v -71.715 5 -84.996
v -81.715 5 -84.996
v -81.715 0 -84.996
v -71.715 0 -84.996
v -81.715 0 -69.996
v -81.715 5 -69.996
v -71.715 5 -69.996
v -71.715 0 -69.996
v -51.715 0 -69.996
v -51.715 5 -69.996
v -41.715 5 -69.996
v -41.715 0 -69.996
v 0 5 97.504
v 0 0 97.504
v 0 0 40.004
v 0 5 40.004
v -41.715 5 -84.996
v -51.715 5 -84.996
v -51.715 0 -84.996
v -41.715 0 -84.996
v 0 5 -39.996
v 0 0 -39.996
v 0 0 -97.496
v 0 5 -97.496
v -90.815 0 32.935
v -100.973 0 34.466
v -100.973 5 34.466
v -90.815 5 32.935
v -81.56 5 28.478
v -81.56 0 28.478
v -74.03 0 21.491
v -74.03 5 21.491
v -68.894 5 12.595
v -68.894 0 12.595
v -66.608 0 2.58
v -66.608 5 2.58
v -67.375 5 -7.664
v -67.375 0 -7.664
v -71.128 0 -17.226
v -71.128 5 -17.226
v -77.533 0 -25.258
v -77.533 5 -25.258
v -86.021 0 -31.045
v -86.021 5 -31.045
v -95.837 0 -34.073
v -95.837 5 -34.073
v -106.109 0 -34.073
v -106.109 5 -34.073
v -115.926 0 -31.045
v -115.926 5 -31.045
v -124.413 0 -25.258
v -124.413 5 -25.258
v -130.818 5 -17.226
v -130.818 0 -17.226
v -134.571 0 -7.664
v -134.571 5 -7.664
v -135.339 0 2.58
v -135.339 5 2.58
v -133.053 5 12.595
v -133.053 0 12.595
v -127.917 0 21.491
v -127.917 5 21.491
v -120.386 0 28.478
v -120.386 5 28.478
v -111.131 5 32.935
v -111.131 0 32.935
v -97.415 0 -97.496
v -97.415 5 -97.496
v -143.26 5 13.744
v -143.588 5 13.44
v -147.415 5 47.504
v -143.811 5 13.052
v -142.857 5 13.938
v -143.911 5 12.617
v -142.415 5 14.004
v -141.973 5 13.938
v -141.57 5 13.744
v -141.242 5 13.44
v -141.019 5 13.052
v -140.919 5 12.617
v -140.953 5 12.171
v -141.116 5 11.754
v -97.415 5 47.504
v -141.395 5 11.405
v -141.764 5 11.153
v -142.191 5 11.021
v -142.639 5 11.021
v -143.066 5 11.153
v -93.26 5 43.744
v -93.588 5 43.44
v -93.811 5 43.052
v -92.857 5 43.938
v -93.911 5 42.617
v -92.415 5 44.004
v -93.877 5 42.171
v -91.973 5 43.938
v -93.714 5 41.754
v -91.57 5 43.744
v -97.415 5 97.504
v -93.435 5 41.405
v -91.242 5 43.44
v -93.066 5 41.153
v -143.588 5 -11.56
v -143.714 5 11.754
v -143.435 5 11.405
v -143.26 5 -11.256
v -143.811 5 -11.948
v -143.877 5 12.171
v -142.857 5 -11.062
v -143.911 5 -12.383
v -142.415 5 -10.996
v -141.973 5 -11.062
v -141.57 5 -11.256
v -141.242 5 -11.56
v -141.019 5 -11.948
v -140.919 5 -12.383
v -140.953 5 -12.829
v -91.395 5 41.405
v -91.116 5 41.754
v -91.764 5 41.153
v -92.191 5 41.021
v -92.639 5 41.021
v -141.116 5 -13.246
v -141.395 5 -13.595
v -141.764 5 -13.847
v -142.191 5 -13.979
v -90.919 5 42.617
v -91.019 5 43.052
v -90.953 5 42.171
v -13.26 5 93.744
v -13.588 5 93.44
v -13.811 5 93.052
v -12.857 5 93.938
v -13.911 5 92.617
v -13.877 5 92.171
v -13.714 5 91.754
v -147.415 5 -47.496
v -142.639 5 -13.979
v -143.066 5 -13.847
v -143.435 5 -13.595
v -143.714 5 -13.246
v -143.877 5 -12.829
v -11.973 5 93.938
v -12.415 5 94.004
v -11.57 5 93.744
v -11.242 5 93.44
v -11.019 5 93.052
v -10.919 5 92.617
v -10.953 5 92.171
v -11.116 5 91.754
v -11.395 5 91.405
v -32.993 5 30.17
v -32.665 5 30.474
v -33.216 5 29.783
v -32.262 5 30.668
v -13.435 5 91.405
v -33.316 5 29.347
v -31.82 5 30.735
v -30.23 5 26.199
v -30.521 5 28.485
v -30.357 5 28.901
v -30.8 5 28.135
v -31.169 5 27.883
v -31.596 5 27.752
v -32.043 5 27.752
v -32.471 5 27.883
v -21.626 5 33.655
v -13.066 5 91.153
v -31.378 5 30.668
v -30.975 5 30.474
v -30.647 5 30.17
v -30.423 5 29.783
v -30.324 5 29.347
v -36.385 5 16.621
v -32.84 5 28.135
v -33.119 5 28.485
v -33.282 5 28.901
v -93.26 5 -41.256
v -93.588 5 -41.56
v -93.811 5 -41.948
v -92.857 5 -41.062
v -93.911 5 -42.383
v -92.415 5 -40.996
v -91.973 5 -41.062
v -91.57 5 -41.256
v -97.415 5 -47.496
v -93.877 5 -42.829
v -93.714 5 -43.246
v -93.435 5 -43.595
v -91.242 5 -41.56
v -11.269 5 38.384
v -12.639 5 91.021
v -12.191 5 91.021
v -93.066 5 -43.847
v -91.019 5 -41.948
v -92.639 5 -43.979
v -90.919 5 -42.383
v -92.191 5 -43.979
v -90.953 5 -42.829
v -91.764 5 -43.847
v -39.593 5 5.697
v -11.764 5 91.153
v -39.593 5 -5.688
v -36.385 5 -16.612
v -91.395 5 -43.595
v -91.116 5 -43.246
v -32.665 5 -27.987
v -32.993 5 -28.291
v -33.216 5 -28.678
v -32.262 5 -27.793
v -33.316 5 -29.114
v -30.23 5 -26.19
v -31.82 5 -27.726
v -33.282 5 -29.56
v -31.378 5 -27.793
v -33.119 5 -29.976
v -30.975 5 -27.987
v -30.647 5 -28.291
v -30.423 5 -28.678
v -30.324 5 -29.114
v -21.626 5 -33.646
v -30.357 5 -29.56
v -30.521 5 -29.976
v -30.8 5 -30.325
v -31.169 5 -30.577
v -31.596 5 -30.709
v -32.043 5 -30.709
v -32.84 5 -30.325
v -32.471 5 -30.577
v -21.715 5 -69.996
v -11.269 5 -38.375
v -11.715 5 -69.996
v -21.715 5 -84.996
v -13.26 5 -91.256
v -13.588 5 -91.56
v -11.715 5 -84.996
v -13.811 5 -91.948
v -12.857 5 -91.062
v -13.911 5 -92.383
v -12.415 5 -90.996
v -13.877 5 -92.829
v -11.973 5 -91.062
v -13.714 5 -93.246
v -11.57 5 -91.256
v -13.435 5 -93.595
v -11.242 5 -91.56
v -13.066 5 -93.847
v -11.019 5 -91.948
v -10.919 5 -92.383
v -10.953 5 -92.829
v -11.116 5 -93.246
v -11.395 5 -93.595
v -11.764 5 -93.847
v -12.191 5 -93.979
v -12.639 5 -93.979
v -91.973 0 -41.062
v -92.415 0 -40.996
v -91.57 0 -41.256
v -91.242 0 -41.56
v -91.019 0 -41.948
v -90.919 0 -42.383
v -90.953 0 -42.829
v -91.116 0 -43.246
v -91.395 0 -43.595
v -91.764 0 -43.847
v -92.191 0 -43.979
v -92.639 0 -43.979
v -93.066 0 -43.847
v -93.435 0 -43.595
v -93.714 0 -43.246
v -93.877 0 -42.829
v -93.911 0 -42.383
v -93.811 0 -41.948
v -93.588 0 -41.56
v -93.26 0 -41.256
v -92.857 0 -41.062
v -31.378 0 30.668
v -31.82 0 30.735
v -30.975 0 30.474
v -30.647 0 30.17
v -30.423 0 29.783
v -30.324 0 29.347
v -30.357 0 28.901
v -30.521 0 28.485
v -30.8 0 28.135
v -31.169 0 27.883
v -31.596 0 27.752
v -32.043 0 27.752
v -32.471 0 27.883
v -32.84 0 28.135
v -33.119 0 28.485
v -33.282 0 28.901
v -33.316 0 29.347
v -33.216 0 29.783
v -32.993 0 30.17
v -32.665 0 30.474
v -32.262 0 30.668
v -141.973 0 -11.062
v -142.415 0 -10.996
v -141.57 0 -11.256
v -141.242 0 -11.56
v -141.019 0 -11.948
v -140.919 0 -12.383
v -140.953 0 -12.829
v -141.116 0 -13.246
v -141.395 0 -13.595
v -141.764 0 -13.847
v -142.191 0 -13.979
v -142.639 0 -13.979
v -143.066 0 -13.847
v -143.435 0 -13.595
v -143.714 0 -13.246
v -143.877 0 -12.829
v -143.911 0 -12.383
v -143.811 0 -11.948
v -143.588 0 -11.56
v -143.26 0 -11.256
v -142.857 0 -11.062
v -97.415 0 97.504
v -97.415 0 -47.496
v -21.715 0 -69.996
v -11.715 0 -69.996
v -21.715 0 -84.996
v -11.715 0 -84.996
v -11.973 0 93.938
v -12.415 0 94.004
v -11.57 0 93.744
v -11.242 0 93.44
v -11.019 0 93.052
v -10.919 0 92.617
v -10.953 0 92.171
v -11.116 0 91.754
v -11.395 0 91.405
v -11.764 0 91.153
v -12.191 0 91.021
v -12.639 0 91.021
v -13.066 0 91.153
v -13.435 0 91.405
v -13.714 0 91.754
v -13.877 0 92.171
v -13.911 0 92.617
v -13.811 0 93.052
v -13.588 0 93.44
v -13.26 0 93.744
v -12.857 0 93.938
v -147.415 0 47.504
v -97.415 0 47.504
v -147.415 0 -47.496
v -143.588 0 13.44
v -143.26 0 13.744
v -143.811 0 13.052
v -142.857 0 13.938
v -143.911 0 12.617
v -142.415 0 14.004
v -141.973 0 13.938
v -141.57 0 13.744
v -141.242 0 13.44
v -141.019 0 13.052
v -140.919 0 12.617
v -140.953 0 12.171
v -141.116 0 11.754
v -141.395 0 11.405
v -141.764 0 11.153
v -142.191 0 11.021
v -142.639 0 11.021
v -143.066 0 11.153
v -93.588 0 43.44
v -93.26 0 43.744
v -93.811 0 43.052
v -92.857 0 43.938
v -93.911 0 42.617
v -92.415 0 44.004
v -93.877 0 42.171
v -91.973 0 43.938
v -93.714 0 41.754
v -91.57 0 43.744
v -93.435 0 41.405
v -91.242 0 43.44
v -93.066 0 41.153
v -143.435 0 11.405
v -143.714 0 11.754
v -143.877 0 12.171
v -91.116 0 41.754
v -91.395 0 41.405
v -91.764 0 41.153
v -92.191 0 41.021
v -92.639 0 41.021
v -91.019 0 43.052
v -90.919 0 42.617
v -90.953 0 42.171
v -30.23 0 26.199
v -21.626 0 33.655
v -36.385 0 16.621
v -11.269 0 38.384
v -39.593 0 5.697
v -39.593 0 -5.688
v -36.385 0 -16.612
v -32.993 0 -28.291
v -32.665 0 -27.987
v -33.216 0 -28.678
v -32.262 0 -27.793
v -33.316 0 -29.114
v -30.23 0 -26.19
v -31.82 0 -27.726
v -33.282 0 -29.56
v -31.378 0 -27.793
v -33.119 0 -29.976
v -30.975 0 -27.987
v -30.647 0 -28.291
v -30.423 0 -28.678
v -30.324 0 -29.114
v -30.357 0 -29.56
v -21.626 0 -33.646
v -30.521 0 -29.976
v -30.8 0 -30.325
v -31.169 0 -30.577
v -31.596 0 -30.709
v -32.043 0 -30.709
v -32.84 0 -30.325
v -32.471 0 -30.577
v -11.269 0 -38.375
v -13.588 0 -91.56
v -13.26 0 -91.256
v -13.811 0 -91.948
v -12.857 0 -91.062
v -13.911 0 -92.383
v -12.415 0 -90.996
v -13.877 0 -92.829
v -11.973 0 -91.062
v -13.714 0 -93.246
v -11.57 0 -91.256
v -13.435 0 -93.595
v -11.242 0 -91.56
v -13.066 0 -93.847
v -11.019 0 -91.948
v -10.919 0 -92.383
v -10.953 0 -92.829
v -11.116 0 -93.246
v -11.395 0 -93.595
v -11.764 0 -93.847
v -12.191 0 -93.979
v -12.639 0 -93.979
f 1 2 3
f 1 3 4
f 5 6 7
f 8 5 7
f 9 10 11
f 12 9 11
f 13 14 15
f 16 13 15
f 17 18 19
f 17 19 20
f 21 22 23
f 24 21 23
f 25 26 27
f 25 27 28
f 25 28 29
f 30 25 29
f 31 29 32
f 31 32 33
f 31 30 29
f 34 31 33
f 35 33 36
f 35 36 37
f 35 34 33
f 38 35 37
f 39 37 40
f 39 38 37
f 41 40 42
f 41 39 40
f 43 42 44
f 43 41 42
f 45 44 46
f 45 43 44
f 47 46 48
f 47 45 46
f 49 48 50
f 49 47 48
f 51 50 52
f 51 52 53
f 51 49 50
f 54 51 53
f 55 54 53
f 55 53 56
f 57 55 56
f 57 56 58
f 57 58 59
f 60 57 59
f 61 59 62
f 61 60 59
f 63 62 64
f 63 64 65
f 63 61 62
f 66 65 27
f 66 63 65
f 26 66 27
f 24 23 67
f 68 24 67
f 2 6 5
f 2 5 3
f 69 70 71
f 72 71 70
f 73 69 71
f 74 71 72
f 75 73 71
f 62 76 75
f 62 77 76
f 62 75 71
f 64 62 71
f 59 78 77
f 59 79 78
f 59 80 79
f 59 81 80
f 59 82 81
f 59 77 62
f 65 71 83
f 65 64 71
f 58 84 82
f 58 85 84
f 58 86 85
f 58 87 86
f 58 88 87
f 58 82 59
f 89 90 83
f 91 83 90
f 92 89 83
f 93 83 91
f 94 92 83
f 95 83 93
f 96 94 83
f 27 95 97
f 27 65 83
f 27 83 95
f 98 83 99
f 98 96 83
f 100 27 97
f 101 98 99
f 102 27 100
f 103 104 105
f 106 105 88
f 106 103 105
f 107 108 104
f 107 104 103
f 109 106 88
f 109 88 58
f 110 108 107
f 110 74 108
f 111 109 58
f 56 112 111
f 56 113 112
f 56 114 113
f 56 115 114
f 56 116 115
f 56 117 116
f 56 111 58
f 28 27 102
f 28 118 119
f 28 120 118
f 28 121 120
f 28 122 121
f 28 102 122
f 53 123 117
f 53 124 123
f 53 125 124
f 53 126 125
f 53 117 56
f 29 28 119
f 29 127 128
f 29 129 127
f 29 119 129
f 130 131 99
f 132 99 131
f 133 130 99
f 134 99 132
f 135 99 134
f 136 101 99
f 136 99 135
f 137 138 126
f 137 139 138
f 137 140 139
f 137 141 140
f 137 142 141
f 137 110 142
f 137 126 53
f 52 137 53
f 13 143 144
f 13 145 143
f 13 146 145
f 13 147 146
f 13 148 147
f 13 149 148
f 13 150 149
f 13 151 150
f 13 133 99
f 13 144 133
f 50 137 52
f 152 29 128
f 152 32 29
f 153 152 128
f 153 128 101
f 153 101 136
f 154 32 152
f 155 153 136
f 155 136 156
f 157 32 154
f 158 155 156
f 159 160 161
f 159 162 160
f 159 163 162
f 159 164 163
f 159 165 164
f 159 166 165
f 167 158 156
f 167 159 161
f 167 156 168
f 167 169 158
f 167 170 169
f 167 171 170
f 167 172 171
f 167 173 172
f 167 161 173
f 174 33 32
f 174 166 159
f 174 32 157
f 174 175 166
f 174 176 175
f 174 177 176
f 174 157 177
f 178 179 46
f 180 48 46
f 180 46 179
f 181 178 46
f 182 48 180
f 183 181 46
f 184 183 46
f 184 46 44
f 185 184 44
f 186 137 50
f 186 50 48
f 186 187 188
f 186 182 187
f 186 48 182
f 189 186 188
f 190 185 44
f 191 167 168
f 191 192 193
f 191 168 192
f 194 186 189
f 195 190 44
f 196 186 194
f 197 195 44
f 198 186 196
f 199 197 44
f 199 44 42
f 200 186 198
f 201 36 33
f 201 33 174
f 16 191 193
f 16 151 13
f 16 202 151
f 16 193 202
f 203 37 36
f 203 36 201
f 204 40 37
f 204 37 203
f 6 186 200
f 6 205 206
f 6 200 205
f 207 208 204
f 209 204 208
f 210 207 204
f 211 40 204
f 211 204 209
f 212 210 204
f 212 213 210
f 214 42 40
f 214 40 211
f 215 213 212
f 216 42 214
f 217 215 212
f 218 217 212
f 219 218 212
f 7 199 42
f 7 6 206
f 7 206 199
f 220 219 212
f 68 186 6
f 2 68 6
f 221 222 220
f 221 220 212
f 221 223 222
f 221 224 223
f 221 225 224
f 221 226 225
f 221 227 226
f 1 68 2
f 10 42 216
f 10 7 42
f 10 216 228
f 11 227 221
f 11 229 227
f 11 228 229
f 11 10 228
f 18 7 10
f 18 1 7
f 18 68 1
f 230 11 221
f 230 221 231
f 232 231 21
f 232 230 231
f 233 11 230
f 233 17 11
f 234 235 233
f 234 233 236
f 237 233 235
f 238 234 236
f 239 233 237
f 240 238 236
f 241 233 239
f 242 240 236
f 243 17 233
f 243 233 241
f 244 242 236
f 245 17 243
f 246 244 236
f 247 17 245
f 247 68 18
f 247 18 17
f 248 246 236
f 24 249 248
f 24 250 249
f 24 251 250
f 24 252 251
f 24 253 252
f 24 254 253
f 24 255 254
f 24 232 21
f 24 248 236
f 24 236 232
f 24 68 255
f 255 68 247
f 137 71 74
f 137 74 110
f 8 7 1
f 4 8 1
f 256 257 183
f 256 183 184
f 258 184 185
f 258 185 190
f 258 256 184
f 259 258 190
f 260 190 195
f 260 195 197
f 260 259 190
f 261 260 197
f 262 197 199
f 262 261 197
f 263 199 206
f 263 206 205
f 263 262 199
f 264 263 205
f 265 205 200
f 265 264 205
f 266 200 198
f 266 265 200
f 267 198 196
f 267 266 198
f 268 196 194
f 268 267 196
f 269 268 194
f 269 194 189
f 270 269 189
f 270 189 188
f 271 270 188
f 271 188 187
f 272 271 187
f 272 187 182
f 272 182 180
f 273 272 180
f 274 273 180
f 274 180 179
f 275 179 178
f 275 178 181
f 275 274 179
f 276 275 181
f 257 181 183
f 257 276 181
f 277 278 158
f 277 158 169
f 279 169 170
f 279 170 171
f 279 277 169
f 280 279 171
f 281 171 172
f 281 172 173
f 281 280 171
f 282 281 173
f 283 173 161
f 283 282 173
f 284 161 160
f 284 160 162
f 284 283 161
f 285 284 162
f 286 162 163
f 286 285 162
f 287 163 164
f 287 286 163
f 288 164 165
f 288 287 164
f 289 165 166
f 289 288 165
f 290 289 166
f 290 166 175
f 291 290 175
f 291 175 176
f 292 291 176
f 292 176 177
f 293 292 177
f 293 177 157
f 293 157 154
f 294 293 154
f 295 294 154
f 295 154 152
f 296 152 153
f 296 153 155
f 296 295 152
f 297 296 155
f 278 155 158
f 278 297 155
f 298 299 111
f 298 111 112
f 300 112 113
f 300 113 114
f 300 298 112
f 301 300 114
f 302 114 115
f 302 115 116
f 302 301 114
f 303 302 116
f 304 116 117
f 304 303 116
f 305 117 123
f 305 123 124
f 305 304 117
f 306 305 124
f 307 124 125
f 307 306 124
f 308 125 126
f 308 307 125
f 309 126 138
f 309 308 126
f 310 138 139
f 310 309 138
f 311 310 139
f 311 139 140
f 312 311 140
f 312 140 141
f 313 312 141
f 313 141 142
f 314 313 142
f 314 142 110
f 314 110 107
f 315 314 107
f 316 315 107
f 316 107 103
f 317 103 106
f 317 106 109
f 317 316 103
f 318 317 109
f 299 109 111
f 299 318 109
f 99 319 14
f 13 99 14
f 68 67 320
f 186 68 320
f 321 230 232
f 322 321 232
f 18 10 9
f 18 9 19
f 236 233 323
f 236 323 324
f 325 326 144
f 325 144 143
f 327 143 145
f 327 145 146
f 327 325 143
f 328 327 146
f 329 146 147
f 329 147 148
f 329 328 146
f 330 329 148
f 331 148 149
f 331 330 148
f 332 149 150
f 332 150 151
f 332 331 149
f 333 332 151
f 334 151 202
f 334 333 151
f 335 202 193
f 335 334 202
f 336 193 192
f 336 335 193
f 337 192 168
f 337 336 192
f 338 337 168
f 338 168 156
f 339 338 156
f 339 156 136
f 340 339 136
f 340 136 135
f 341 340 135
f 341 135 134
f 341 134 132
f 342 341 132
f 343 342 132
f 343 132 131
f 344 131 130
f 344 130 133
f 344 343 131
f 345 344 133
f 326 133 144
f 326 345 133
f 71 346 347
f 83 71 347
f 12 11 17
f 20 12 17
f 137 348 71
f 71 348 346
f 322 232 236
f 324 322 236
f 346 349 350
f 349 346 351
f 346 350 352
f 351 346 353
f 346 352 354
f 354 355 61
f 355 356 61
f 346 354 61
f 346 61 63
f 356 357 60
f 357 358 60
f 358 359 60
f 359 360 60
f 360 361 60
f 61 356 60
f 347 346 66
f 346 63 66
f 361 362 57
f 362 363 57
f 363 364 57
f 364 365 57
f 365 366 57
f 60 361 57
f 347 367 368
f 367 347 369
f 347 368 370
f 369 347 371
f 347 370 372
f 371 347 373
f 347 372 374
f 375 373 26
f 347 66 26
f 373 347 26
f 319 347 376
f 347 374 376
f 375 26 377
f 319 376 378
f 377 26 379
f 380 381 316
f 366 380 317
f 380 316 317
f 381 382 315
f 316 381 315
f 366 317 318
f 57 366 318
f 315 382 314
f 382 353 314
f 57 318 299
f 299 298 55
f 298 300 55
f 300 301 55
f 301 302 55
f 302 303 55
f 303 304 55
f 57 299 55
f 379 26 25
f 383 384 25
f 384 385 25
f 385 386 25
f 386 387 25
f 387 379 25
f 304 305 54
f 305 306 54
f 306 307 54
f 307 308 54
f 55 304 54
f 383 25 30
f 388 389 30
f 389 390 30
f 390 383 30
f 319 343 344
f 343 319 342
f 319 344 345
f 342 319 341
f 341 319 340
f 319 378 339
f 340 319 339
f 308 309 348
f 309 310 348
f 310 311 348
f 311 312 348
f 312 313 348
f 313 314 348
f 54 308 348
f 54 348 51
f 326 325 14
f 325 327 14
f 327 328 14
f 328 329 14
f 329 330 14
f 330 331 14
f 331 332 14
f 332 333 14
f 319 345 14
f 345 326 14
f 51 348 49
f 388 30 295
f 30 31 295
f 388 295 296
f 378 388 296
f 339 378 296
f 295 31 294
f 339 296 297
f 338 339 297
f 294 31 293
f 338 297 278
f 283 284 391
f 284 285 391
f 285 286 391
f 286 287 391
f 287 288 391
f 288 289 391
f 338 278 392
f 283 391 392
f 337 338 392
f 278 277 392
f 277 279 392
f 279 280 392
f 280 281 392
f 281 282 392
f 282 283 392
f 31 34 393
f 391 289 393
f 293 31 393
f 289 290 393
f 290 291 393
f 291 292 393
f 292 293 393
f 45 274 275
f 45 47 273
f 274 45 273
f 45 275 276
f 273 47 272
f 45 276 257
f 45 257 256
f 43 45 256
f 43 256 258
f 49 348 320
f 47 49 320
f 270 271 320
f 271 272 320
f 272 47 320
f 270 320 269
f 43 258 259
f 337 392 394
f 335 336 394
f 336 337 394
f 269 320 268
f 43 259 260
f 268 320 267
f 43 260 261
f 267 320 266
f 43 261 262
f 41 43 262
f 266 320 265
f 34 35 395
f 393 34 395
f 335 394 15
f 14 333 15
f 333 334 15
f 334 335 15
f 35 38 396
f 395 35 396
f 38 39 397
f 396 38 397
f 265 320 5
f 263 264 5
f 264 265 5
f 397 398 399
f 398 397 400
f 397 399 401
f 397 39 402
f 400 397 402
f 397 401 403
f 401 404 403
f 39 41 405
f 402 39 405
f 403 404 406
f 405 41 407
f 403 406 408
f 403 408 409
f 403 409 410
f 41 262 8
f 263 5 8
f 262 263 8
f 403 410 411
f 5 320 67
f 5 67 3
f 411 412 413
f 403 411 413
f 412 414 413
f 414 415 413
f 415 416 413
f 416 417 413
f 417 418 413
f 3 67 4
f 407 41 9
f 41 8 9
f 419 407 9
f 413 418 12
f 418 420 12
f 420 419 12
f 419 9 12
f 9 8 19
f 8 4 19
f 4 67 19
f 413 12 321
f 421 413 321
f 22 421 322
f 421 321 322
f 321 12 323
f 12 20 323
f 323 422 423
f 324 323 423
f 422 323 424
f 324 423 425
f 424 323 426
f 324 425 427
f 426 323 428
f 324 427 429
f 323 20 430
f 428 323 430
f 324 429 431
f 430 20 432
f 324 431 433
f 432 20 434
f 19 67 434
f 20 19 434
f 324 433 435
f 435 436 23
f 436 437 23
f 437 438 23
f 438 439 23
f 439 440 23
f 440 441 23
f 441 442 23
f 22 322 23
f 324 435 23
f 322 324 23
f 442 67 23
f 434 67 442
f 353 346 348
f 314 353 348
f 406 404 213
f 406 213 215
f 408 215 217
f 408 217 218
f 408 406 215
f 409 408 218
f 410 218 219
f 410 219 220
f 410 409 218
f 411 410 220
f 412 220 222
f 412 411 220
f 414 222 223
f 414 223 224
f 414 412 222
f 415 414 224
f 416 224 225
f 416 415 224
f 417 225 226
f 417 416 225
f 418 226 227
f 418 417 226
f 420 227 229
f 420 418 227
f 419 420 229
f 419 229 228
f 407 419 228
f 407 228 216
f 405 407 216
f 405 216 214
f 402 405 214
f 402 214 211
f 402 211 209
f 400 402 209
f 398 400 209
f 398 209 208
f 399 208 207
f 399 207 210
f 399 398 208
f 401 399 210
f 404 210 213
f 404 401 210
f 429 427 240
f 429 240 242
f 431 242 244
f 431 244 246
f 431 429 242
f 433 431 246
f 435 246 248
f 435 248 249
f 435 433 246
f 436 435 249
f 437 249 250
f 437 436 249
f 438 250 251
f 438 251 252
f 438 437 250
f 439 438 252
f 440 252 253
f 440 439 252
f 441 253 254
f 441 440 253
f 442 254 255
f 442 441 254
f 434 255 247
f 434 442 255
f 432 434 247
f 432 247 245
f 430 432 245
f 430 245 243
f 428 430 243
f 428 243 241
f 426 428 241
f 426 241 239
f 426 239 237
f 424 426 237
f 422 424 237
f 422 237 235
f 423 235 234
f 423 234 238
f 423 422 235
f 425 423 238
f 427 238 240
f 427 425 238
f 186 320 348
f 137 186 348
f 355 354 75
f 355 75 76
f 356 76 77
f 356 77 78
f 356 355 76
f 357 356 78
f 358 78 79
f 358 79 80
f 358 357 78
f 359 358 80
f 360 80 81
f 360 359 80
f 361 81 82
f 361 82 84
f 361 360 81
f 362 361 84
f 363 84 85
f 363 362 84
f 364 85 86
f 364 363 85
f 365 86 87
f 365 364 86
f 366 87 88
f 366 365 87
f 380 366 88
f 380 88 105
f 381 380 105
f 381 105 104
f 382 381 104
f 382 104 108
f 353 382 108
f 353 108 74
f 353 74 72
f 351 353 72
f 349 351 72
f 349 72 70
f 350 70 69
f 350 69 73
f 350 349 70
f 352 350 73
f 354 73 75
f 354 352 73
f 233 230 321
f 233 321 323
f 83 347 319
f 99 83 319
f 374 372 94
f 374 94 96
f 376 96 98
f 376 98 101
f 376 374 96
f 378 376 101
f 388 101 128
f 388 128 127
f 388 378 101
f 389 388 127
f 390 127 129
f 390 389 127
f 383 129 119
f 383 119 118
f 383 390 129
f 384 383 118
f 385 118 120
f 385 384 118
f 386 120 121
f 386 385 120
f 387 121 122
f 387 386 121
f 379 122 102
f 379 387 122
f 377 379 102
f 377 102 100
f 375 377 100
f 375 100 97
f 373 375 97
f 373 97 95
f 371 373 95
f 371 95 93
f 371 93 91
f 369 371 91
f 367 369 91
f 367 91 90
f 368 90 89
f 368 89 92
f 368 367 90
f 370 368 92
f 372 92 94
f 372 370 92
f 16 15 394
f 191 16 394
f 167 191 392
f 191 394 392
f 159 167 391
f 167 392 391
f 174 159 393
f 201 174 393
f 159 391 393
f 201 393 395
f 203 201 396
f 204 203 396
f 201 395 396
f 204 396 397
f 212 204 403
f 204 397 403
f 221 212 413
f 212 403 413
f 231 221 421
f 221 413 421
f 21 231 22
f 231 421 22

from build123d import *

# Parameters (mm, degrees)
ESQUISSE1_R             = 1.5
ESQUISSE1_R_2           = 34.4618877
BOSS_EXTRU_1_DEPTH      = 5
ENL_V_MAT_EXTRU_1_REACH = 178.814
ESQUISSE2_W             = 10
ESQUISSE2_H             = 15


with BuildPart() as part:
    # Esquisse1 → Boss.-Extru.1 (new body)
    with BuildSketch(Plane(origin=(0, 0, 0), x_dir=(1, 0, 0), z_dir=(0, 1, 0))):
        with BuildLine():
            Line((-97.415, -97.504460786), (0, -97.504460786))
            Line((0, -97.504460786), (0, -40.004460786))
            ThreePointArc((0, -40.004460786), (-40, -0.004460786), (0, 39.995539214))
            Line((0, 39.995539214), (0, 97.495539214))
            Line((0, 97.495539214), (-97.415, 97.495539214))
            Line((-97.415, 97.495539214), (-97.415, 47.495539214))
            Line((-97.415, 47.495539214), (-147.415, 47.495539214))
            Line((-147.415, 47.495539214), (-147.415, -47.504460786))
            Line((-147.415, -47.504460786), (-97.415, -47.504460786))
            Line((-97.415, -47.504460786), (-97.415, -97.504460786))
        make_face()
        with Locations(Location((-142.415, -12.504460786, 0), (0, 0, 270))):
            Circle(ESQUISSE1_R, mode=Mode.SUBTRACT)
        with Locations(Location((-92.415, -42.504460786, 0), (0, 0, 270))):
            Circle(ESQUISSE1_R, mode=Mode.SUBTRACT)
        with Locations(Location((-12.415, -92.504460786, 0), (0, 0, 270))):
            Circle(ESQUISSE1_R, mode=Mode.SUBTRACT)
        with Locations(Location((-31.819805153, -29.234805153, 0), (0, 0, 270))):
            Circle(ESQUISSE1_R, mode=Mode.SUBTRACT)
        with Locations(Location((-142.415, 12.495539214, 0), (0, 0, 270))):
            Circle(ESQUISSE1_R, mode=Mode.SUBTRACT)
        with Locations(Location((-100.973221988, -0.004460786, 0), (0, 0, 270))):
            Circle(ESQUISSE1_R_2, mode=Mode.SUBTRACT)
        with Locations(Location((-92.415, 42.495539214, 0), (0, 0, 270))):
            Circle(ESQUISSE1_R, mode=Mode.SUBTRACT)
        with Locations(Location((-31.819805153, 29.225883581, 0), (0, 0, 270))):
            Circle(ESQUISSE1_R, mode=Mode.SUBTRACT)
        with Locations(Location((-12.415, 92.495539214, 0), (0, 0, 270))):
            Circle(ESQUISSE1_R, mode=Mode.SUBTRACT)
    extrude(amount=BOSS_EXTRU_1_DEPTH)

    # Esquisse2 → Enlèv. mat.-Extru.1 (cut, up to next)
    with BuildSketch(Plane(origin=(0, 5, 0), x_dir=(1, 0, 0), z_dir=(0, 1, 0)), mode=Mode.PRIVATE) as enl_v_mat_extru_1_sk1:
        with Locations((-76.715147883, 77.495539214)):
            Rectangle(ESQUISSE2_W, ESQUISSE2_H)
    enl_v_mat_extru_1_tool1 = extrude(enl_v_mat_extru_1_sk1.sketch, amount=-ENL_V_MAT_EXTRU_1_REACH, mode=Mode.PRIVATE) & part.part
    # Esquisse2 → Enlèv. mat.-Extru.1 (cut, up to next)
    with BuildSketch(Plane(origin=(0, 5, 0), x_dir=(1, 0, 0), z_dir=(0, 1, 0)), mode=Mode.PRIVATE) as enl_v_mat_extru_1_sk2:
        with Locations((-46.715147883, 77.495539214)):
            Rectangle(ESQUISSE2_W, ESQUISSE2_H)
    enl_v_mat_extru_1_tool2 = extrude(enl_v_mat_extru_1_sk2.sketch, amount=-ENL_V_MAT_EXTRU_1_REACH, mode=Mode.PRIVATE) & part.part
    # Esquisse2 → Enlèv. mat.-Extru.1 (cut, up to next)
    with BuildSketch(Plane(origin=(0, 5, 0), x_dir=(1, 0, 0), z_dir=(0, 1, 0)), mode=Mode.PRIVATE) as enl_v_mat_extru_1_sk3:
        with Locations((-16.715147883, 77.495539214)):
            Rectangle(ESQUISSE2_W, ESQUISSE2_H)
    enl_v_mat_extru_1_tool3 = extrude(enl_v_mat_extru_1_sk3.sketch, amount=-ENL_V_MAT_EXTRU_1_REACH, mode=Mode.PRIVATE) & part.part
    add(enl_v_mat_extru_1_tool1.solids().sort_by_distance((-76.715148, 5, -77.495539))[0], mode=Mode.SUBTRACT)
    add(enl_v_mat_extru_1_tool2.solids().sort_by_distance((-46.715148, 5, -77.495539))[0], mode=Mode.SUBTRACT)
    add(enl_v_mat_extru_1_tool3.solids().sort_by_distance((-16.715148, 5, -77.495539))[0], mode=Mode.SUBTRACT)


solid = part.part
